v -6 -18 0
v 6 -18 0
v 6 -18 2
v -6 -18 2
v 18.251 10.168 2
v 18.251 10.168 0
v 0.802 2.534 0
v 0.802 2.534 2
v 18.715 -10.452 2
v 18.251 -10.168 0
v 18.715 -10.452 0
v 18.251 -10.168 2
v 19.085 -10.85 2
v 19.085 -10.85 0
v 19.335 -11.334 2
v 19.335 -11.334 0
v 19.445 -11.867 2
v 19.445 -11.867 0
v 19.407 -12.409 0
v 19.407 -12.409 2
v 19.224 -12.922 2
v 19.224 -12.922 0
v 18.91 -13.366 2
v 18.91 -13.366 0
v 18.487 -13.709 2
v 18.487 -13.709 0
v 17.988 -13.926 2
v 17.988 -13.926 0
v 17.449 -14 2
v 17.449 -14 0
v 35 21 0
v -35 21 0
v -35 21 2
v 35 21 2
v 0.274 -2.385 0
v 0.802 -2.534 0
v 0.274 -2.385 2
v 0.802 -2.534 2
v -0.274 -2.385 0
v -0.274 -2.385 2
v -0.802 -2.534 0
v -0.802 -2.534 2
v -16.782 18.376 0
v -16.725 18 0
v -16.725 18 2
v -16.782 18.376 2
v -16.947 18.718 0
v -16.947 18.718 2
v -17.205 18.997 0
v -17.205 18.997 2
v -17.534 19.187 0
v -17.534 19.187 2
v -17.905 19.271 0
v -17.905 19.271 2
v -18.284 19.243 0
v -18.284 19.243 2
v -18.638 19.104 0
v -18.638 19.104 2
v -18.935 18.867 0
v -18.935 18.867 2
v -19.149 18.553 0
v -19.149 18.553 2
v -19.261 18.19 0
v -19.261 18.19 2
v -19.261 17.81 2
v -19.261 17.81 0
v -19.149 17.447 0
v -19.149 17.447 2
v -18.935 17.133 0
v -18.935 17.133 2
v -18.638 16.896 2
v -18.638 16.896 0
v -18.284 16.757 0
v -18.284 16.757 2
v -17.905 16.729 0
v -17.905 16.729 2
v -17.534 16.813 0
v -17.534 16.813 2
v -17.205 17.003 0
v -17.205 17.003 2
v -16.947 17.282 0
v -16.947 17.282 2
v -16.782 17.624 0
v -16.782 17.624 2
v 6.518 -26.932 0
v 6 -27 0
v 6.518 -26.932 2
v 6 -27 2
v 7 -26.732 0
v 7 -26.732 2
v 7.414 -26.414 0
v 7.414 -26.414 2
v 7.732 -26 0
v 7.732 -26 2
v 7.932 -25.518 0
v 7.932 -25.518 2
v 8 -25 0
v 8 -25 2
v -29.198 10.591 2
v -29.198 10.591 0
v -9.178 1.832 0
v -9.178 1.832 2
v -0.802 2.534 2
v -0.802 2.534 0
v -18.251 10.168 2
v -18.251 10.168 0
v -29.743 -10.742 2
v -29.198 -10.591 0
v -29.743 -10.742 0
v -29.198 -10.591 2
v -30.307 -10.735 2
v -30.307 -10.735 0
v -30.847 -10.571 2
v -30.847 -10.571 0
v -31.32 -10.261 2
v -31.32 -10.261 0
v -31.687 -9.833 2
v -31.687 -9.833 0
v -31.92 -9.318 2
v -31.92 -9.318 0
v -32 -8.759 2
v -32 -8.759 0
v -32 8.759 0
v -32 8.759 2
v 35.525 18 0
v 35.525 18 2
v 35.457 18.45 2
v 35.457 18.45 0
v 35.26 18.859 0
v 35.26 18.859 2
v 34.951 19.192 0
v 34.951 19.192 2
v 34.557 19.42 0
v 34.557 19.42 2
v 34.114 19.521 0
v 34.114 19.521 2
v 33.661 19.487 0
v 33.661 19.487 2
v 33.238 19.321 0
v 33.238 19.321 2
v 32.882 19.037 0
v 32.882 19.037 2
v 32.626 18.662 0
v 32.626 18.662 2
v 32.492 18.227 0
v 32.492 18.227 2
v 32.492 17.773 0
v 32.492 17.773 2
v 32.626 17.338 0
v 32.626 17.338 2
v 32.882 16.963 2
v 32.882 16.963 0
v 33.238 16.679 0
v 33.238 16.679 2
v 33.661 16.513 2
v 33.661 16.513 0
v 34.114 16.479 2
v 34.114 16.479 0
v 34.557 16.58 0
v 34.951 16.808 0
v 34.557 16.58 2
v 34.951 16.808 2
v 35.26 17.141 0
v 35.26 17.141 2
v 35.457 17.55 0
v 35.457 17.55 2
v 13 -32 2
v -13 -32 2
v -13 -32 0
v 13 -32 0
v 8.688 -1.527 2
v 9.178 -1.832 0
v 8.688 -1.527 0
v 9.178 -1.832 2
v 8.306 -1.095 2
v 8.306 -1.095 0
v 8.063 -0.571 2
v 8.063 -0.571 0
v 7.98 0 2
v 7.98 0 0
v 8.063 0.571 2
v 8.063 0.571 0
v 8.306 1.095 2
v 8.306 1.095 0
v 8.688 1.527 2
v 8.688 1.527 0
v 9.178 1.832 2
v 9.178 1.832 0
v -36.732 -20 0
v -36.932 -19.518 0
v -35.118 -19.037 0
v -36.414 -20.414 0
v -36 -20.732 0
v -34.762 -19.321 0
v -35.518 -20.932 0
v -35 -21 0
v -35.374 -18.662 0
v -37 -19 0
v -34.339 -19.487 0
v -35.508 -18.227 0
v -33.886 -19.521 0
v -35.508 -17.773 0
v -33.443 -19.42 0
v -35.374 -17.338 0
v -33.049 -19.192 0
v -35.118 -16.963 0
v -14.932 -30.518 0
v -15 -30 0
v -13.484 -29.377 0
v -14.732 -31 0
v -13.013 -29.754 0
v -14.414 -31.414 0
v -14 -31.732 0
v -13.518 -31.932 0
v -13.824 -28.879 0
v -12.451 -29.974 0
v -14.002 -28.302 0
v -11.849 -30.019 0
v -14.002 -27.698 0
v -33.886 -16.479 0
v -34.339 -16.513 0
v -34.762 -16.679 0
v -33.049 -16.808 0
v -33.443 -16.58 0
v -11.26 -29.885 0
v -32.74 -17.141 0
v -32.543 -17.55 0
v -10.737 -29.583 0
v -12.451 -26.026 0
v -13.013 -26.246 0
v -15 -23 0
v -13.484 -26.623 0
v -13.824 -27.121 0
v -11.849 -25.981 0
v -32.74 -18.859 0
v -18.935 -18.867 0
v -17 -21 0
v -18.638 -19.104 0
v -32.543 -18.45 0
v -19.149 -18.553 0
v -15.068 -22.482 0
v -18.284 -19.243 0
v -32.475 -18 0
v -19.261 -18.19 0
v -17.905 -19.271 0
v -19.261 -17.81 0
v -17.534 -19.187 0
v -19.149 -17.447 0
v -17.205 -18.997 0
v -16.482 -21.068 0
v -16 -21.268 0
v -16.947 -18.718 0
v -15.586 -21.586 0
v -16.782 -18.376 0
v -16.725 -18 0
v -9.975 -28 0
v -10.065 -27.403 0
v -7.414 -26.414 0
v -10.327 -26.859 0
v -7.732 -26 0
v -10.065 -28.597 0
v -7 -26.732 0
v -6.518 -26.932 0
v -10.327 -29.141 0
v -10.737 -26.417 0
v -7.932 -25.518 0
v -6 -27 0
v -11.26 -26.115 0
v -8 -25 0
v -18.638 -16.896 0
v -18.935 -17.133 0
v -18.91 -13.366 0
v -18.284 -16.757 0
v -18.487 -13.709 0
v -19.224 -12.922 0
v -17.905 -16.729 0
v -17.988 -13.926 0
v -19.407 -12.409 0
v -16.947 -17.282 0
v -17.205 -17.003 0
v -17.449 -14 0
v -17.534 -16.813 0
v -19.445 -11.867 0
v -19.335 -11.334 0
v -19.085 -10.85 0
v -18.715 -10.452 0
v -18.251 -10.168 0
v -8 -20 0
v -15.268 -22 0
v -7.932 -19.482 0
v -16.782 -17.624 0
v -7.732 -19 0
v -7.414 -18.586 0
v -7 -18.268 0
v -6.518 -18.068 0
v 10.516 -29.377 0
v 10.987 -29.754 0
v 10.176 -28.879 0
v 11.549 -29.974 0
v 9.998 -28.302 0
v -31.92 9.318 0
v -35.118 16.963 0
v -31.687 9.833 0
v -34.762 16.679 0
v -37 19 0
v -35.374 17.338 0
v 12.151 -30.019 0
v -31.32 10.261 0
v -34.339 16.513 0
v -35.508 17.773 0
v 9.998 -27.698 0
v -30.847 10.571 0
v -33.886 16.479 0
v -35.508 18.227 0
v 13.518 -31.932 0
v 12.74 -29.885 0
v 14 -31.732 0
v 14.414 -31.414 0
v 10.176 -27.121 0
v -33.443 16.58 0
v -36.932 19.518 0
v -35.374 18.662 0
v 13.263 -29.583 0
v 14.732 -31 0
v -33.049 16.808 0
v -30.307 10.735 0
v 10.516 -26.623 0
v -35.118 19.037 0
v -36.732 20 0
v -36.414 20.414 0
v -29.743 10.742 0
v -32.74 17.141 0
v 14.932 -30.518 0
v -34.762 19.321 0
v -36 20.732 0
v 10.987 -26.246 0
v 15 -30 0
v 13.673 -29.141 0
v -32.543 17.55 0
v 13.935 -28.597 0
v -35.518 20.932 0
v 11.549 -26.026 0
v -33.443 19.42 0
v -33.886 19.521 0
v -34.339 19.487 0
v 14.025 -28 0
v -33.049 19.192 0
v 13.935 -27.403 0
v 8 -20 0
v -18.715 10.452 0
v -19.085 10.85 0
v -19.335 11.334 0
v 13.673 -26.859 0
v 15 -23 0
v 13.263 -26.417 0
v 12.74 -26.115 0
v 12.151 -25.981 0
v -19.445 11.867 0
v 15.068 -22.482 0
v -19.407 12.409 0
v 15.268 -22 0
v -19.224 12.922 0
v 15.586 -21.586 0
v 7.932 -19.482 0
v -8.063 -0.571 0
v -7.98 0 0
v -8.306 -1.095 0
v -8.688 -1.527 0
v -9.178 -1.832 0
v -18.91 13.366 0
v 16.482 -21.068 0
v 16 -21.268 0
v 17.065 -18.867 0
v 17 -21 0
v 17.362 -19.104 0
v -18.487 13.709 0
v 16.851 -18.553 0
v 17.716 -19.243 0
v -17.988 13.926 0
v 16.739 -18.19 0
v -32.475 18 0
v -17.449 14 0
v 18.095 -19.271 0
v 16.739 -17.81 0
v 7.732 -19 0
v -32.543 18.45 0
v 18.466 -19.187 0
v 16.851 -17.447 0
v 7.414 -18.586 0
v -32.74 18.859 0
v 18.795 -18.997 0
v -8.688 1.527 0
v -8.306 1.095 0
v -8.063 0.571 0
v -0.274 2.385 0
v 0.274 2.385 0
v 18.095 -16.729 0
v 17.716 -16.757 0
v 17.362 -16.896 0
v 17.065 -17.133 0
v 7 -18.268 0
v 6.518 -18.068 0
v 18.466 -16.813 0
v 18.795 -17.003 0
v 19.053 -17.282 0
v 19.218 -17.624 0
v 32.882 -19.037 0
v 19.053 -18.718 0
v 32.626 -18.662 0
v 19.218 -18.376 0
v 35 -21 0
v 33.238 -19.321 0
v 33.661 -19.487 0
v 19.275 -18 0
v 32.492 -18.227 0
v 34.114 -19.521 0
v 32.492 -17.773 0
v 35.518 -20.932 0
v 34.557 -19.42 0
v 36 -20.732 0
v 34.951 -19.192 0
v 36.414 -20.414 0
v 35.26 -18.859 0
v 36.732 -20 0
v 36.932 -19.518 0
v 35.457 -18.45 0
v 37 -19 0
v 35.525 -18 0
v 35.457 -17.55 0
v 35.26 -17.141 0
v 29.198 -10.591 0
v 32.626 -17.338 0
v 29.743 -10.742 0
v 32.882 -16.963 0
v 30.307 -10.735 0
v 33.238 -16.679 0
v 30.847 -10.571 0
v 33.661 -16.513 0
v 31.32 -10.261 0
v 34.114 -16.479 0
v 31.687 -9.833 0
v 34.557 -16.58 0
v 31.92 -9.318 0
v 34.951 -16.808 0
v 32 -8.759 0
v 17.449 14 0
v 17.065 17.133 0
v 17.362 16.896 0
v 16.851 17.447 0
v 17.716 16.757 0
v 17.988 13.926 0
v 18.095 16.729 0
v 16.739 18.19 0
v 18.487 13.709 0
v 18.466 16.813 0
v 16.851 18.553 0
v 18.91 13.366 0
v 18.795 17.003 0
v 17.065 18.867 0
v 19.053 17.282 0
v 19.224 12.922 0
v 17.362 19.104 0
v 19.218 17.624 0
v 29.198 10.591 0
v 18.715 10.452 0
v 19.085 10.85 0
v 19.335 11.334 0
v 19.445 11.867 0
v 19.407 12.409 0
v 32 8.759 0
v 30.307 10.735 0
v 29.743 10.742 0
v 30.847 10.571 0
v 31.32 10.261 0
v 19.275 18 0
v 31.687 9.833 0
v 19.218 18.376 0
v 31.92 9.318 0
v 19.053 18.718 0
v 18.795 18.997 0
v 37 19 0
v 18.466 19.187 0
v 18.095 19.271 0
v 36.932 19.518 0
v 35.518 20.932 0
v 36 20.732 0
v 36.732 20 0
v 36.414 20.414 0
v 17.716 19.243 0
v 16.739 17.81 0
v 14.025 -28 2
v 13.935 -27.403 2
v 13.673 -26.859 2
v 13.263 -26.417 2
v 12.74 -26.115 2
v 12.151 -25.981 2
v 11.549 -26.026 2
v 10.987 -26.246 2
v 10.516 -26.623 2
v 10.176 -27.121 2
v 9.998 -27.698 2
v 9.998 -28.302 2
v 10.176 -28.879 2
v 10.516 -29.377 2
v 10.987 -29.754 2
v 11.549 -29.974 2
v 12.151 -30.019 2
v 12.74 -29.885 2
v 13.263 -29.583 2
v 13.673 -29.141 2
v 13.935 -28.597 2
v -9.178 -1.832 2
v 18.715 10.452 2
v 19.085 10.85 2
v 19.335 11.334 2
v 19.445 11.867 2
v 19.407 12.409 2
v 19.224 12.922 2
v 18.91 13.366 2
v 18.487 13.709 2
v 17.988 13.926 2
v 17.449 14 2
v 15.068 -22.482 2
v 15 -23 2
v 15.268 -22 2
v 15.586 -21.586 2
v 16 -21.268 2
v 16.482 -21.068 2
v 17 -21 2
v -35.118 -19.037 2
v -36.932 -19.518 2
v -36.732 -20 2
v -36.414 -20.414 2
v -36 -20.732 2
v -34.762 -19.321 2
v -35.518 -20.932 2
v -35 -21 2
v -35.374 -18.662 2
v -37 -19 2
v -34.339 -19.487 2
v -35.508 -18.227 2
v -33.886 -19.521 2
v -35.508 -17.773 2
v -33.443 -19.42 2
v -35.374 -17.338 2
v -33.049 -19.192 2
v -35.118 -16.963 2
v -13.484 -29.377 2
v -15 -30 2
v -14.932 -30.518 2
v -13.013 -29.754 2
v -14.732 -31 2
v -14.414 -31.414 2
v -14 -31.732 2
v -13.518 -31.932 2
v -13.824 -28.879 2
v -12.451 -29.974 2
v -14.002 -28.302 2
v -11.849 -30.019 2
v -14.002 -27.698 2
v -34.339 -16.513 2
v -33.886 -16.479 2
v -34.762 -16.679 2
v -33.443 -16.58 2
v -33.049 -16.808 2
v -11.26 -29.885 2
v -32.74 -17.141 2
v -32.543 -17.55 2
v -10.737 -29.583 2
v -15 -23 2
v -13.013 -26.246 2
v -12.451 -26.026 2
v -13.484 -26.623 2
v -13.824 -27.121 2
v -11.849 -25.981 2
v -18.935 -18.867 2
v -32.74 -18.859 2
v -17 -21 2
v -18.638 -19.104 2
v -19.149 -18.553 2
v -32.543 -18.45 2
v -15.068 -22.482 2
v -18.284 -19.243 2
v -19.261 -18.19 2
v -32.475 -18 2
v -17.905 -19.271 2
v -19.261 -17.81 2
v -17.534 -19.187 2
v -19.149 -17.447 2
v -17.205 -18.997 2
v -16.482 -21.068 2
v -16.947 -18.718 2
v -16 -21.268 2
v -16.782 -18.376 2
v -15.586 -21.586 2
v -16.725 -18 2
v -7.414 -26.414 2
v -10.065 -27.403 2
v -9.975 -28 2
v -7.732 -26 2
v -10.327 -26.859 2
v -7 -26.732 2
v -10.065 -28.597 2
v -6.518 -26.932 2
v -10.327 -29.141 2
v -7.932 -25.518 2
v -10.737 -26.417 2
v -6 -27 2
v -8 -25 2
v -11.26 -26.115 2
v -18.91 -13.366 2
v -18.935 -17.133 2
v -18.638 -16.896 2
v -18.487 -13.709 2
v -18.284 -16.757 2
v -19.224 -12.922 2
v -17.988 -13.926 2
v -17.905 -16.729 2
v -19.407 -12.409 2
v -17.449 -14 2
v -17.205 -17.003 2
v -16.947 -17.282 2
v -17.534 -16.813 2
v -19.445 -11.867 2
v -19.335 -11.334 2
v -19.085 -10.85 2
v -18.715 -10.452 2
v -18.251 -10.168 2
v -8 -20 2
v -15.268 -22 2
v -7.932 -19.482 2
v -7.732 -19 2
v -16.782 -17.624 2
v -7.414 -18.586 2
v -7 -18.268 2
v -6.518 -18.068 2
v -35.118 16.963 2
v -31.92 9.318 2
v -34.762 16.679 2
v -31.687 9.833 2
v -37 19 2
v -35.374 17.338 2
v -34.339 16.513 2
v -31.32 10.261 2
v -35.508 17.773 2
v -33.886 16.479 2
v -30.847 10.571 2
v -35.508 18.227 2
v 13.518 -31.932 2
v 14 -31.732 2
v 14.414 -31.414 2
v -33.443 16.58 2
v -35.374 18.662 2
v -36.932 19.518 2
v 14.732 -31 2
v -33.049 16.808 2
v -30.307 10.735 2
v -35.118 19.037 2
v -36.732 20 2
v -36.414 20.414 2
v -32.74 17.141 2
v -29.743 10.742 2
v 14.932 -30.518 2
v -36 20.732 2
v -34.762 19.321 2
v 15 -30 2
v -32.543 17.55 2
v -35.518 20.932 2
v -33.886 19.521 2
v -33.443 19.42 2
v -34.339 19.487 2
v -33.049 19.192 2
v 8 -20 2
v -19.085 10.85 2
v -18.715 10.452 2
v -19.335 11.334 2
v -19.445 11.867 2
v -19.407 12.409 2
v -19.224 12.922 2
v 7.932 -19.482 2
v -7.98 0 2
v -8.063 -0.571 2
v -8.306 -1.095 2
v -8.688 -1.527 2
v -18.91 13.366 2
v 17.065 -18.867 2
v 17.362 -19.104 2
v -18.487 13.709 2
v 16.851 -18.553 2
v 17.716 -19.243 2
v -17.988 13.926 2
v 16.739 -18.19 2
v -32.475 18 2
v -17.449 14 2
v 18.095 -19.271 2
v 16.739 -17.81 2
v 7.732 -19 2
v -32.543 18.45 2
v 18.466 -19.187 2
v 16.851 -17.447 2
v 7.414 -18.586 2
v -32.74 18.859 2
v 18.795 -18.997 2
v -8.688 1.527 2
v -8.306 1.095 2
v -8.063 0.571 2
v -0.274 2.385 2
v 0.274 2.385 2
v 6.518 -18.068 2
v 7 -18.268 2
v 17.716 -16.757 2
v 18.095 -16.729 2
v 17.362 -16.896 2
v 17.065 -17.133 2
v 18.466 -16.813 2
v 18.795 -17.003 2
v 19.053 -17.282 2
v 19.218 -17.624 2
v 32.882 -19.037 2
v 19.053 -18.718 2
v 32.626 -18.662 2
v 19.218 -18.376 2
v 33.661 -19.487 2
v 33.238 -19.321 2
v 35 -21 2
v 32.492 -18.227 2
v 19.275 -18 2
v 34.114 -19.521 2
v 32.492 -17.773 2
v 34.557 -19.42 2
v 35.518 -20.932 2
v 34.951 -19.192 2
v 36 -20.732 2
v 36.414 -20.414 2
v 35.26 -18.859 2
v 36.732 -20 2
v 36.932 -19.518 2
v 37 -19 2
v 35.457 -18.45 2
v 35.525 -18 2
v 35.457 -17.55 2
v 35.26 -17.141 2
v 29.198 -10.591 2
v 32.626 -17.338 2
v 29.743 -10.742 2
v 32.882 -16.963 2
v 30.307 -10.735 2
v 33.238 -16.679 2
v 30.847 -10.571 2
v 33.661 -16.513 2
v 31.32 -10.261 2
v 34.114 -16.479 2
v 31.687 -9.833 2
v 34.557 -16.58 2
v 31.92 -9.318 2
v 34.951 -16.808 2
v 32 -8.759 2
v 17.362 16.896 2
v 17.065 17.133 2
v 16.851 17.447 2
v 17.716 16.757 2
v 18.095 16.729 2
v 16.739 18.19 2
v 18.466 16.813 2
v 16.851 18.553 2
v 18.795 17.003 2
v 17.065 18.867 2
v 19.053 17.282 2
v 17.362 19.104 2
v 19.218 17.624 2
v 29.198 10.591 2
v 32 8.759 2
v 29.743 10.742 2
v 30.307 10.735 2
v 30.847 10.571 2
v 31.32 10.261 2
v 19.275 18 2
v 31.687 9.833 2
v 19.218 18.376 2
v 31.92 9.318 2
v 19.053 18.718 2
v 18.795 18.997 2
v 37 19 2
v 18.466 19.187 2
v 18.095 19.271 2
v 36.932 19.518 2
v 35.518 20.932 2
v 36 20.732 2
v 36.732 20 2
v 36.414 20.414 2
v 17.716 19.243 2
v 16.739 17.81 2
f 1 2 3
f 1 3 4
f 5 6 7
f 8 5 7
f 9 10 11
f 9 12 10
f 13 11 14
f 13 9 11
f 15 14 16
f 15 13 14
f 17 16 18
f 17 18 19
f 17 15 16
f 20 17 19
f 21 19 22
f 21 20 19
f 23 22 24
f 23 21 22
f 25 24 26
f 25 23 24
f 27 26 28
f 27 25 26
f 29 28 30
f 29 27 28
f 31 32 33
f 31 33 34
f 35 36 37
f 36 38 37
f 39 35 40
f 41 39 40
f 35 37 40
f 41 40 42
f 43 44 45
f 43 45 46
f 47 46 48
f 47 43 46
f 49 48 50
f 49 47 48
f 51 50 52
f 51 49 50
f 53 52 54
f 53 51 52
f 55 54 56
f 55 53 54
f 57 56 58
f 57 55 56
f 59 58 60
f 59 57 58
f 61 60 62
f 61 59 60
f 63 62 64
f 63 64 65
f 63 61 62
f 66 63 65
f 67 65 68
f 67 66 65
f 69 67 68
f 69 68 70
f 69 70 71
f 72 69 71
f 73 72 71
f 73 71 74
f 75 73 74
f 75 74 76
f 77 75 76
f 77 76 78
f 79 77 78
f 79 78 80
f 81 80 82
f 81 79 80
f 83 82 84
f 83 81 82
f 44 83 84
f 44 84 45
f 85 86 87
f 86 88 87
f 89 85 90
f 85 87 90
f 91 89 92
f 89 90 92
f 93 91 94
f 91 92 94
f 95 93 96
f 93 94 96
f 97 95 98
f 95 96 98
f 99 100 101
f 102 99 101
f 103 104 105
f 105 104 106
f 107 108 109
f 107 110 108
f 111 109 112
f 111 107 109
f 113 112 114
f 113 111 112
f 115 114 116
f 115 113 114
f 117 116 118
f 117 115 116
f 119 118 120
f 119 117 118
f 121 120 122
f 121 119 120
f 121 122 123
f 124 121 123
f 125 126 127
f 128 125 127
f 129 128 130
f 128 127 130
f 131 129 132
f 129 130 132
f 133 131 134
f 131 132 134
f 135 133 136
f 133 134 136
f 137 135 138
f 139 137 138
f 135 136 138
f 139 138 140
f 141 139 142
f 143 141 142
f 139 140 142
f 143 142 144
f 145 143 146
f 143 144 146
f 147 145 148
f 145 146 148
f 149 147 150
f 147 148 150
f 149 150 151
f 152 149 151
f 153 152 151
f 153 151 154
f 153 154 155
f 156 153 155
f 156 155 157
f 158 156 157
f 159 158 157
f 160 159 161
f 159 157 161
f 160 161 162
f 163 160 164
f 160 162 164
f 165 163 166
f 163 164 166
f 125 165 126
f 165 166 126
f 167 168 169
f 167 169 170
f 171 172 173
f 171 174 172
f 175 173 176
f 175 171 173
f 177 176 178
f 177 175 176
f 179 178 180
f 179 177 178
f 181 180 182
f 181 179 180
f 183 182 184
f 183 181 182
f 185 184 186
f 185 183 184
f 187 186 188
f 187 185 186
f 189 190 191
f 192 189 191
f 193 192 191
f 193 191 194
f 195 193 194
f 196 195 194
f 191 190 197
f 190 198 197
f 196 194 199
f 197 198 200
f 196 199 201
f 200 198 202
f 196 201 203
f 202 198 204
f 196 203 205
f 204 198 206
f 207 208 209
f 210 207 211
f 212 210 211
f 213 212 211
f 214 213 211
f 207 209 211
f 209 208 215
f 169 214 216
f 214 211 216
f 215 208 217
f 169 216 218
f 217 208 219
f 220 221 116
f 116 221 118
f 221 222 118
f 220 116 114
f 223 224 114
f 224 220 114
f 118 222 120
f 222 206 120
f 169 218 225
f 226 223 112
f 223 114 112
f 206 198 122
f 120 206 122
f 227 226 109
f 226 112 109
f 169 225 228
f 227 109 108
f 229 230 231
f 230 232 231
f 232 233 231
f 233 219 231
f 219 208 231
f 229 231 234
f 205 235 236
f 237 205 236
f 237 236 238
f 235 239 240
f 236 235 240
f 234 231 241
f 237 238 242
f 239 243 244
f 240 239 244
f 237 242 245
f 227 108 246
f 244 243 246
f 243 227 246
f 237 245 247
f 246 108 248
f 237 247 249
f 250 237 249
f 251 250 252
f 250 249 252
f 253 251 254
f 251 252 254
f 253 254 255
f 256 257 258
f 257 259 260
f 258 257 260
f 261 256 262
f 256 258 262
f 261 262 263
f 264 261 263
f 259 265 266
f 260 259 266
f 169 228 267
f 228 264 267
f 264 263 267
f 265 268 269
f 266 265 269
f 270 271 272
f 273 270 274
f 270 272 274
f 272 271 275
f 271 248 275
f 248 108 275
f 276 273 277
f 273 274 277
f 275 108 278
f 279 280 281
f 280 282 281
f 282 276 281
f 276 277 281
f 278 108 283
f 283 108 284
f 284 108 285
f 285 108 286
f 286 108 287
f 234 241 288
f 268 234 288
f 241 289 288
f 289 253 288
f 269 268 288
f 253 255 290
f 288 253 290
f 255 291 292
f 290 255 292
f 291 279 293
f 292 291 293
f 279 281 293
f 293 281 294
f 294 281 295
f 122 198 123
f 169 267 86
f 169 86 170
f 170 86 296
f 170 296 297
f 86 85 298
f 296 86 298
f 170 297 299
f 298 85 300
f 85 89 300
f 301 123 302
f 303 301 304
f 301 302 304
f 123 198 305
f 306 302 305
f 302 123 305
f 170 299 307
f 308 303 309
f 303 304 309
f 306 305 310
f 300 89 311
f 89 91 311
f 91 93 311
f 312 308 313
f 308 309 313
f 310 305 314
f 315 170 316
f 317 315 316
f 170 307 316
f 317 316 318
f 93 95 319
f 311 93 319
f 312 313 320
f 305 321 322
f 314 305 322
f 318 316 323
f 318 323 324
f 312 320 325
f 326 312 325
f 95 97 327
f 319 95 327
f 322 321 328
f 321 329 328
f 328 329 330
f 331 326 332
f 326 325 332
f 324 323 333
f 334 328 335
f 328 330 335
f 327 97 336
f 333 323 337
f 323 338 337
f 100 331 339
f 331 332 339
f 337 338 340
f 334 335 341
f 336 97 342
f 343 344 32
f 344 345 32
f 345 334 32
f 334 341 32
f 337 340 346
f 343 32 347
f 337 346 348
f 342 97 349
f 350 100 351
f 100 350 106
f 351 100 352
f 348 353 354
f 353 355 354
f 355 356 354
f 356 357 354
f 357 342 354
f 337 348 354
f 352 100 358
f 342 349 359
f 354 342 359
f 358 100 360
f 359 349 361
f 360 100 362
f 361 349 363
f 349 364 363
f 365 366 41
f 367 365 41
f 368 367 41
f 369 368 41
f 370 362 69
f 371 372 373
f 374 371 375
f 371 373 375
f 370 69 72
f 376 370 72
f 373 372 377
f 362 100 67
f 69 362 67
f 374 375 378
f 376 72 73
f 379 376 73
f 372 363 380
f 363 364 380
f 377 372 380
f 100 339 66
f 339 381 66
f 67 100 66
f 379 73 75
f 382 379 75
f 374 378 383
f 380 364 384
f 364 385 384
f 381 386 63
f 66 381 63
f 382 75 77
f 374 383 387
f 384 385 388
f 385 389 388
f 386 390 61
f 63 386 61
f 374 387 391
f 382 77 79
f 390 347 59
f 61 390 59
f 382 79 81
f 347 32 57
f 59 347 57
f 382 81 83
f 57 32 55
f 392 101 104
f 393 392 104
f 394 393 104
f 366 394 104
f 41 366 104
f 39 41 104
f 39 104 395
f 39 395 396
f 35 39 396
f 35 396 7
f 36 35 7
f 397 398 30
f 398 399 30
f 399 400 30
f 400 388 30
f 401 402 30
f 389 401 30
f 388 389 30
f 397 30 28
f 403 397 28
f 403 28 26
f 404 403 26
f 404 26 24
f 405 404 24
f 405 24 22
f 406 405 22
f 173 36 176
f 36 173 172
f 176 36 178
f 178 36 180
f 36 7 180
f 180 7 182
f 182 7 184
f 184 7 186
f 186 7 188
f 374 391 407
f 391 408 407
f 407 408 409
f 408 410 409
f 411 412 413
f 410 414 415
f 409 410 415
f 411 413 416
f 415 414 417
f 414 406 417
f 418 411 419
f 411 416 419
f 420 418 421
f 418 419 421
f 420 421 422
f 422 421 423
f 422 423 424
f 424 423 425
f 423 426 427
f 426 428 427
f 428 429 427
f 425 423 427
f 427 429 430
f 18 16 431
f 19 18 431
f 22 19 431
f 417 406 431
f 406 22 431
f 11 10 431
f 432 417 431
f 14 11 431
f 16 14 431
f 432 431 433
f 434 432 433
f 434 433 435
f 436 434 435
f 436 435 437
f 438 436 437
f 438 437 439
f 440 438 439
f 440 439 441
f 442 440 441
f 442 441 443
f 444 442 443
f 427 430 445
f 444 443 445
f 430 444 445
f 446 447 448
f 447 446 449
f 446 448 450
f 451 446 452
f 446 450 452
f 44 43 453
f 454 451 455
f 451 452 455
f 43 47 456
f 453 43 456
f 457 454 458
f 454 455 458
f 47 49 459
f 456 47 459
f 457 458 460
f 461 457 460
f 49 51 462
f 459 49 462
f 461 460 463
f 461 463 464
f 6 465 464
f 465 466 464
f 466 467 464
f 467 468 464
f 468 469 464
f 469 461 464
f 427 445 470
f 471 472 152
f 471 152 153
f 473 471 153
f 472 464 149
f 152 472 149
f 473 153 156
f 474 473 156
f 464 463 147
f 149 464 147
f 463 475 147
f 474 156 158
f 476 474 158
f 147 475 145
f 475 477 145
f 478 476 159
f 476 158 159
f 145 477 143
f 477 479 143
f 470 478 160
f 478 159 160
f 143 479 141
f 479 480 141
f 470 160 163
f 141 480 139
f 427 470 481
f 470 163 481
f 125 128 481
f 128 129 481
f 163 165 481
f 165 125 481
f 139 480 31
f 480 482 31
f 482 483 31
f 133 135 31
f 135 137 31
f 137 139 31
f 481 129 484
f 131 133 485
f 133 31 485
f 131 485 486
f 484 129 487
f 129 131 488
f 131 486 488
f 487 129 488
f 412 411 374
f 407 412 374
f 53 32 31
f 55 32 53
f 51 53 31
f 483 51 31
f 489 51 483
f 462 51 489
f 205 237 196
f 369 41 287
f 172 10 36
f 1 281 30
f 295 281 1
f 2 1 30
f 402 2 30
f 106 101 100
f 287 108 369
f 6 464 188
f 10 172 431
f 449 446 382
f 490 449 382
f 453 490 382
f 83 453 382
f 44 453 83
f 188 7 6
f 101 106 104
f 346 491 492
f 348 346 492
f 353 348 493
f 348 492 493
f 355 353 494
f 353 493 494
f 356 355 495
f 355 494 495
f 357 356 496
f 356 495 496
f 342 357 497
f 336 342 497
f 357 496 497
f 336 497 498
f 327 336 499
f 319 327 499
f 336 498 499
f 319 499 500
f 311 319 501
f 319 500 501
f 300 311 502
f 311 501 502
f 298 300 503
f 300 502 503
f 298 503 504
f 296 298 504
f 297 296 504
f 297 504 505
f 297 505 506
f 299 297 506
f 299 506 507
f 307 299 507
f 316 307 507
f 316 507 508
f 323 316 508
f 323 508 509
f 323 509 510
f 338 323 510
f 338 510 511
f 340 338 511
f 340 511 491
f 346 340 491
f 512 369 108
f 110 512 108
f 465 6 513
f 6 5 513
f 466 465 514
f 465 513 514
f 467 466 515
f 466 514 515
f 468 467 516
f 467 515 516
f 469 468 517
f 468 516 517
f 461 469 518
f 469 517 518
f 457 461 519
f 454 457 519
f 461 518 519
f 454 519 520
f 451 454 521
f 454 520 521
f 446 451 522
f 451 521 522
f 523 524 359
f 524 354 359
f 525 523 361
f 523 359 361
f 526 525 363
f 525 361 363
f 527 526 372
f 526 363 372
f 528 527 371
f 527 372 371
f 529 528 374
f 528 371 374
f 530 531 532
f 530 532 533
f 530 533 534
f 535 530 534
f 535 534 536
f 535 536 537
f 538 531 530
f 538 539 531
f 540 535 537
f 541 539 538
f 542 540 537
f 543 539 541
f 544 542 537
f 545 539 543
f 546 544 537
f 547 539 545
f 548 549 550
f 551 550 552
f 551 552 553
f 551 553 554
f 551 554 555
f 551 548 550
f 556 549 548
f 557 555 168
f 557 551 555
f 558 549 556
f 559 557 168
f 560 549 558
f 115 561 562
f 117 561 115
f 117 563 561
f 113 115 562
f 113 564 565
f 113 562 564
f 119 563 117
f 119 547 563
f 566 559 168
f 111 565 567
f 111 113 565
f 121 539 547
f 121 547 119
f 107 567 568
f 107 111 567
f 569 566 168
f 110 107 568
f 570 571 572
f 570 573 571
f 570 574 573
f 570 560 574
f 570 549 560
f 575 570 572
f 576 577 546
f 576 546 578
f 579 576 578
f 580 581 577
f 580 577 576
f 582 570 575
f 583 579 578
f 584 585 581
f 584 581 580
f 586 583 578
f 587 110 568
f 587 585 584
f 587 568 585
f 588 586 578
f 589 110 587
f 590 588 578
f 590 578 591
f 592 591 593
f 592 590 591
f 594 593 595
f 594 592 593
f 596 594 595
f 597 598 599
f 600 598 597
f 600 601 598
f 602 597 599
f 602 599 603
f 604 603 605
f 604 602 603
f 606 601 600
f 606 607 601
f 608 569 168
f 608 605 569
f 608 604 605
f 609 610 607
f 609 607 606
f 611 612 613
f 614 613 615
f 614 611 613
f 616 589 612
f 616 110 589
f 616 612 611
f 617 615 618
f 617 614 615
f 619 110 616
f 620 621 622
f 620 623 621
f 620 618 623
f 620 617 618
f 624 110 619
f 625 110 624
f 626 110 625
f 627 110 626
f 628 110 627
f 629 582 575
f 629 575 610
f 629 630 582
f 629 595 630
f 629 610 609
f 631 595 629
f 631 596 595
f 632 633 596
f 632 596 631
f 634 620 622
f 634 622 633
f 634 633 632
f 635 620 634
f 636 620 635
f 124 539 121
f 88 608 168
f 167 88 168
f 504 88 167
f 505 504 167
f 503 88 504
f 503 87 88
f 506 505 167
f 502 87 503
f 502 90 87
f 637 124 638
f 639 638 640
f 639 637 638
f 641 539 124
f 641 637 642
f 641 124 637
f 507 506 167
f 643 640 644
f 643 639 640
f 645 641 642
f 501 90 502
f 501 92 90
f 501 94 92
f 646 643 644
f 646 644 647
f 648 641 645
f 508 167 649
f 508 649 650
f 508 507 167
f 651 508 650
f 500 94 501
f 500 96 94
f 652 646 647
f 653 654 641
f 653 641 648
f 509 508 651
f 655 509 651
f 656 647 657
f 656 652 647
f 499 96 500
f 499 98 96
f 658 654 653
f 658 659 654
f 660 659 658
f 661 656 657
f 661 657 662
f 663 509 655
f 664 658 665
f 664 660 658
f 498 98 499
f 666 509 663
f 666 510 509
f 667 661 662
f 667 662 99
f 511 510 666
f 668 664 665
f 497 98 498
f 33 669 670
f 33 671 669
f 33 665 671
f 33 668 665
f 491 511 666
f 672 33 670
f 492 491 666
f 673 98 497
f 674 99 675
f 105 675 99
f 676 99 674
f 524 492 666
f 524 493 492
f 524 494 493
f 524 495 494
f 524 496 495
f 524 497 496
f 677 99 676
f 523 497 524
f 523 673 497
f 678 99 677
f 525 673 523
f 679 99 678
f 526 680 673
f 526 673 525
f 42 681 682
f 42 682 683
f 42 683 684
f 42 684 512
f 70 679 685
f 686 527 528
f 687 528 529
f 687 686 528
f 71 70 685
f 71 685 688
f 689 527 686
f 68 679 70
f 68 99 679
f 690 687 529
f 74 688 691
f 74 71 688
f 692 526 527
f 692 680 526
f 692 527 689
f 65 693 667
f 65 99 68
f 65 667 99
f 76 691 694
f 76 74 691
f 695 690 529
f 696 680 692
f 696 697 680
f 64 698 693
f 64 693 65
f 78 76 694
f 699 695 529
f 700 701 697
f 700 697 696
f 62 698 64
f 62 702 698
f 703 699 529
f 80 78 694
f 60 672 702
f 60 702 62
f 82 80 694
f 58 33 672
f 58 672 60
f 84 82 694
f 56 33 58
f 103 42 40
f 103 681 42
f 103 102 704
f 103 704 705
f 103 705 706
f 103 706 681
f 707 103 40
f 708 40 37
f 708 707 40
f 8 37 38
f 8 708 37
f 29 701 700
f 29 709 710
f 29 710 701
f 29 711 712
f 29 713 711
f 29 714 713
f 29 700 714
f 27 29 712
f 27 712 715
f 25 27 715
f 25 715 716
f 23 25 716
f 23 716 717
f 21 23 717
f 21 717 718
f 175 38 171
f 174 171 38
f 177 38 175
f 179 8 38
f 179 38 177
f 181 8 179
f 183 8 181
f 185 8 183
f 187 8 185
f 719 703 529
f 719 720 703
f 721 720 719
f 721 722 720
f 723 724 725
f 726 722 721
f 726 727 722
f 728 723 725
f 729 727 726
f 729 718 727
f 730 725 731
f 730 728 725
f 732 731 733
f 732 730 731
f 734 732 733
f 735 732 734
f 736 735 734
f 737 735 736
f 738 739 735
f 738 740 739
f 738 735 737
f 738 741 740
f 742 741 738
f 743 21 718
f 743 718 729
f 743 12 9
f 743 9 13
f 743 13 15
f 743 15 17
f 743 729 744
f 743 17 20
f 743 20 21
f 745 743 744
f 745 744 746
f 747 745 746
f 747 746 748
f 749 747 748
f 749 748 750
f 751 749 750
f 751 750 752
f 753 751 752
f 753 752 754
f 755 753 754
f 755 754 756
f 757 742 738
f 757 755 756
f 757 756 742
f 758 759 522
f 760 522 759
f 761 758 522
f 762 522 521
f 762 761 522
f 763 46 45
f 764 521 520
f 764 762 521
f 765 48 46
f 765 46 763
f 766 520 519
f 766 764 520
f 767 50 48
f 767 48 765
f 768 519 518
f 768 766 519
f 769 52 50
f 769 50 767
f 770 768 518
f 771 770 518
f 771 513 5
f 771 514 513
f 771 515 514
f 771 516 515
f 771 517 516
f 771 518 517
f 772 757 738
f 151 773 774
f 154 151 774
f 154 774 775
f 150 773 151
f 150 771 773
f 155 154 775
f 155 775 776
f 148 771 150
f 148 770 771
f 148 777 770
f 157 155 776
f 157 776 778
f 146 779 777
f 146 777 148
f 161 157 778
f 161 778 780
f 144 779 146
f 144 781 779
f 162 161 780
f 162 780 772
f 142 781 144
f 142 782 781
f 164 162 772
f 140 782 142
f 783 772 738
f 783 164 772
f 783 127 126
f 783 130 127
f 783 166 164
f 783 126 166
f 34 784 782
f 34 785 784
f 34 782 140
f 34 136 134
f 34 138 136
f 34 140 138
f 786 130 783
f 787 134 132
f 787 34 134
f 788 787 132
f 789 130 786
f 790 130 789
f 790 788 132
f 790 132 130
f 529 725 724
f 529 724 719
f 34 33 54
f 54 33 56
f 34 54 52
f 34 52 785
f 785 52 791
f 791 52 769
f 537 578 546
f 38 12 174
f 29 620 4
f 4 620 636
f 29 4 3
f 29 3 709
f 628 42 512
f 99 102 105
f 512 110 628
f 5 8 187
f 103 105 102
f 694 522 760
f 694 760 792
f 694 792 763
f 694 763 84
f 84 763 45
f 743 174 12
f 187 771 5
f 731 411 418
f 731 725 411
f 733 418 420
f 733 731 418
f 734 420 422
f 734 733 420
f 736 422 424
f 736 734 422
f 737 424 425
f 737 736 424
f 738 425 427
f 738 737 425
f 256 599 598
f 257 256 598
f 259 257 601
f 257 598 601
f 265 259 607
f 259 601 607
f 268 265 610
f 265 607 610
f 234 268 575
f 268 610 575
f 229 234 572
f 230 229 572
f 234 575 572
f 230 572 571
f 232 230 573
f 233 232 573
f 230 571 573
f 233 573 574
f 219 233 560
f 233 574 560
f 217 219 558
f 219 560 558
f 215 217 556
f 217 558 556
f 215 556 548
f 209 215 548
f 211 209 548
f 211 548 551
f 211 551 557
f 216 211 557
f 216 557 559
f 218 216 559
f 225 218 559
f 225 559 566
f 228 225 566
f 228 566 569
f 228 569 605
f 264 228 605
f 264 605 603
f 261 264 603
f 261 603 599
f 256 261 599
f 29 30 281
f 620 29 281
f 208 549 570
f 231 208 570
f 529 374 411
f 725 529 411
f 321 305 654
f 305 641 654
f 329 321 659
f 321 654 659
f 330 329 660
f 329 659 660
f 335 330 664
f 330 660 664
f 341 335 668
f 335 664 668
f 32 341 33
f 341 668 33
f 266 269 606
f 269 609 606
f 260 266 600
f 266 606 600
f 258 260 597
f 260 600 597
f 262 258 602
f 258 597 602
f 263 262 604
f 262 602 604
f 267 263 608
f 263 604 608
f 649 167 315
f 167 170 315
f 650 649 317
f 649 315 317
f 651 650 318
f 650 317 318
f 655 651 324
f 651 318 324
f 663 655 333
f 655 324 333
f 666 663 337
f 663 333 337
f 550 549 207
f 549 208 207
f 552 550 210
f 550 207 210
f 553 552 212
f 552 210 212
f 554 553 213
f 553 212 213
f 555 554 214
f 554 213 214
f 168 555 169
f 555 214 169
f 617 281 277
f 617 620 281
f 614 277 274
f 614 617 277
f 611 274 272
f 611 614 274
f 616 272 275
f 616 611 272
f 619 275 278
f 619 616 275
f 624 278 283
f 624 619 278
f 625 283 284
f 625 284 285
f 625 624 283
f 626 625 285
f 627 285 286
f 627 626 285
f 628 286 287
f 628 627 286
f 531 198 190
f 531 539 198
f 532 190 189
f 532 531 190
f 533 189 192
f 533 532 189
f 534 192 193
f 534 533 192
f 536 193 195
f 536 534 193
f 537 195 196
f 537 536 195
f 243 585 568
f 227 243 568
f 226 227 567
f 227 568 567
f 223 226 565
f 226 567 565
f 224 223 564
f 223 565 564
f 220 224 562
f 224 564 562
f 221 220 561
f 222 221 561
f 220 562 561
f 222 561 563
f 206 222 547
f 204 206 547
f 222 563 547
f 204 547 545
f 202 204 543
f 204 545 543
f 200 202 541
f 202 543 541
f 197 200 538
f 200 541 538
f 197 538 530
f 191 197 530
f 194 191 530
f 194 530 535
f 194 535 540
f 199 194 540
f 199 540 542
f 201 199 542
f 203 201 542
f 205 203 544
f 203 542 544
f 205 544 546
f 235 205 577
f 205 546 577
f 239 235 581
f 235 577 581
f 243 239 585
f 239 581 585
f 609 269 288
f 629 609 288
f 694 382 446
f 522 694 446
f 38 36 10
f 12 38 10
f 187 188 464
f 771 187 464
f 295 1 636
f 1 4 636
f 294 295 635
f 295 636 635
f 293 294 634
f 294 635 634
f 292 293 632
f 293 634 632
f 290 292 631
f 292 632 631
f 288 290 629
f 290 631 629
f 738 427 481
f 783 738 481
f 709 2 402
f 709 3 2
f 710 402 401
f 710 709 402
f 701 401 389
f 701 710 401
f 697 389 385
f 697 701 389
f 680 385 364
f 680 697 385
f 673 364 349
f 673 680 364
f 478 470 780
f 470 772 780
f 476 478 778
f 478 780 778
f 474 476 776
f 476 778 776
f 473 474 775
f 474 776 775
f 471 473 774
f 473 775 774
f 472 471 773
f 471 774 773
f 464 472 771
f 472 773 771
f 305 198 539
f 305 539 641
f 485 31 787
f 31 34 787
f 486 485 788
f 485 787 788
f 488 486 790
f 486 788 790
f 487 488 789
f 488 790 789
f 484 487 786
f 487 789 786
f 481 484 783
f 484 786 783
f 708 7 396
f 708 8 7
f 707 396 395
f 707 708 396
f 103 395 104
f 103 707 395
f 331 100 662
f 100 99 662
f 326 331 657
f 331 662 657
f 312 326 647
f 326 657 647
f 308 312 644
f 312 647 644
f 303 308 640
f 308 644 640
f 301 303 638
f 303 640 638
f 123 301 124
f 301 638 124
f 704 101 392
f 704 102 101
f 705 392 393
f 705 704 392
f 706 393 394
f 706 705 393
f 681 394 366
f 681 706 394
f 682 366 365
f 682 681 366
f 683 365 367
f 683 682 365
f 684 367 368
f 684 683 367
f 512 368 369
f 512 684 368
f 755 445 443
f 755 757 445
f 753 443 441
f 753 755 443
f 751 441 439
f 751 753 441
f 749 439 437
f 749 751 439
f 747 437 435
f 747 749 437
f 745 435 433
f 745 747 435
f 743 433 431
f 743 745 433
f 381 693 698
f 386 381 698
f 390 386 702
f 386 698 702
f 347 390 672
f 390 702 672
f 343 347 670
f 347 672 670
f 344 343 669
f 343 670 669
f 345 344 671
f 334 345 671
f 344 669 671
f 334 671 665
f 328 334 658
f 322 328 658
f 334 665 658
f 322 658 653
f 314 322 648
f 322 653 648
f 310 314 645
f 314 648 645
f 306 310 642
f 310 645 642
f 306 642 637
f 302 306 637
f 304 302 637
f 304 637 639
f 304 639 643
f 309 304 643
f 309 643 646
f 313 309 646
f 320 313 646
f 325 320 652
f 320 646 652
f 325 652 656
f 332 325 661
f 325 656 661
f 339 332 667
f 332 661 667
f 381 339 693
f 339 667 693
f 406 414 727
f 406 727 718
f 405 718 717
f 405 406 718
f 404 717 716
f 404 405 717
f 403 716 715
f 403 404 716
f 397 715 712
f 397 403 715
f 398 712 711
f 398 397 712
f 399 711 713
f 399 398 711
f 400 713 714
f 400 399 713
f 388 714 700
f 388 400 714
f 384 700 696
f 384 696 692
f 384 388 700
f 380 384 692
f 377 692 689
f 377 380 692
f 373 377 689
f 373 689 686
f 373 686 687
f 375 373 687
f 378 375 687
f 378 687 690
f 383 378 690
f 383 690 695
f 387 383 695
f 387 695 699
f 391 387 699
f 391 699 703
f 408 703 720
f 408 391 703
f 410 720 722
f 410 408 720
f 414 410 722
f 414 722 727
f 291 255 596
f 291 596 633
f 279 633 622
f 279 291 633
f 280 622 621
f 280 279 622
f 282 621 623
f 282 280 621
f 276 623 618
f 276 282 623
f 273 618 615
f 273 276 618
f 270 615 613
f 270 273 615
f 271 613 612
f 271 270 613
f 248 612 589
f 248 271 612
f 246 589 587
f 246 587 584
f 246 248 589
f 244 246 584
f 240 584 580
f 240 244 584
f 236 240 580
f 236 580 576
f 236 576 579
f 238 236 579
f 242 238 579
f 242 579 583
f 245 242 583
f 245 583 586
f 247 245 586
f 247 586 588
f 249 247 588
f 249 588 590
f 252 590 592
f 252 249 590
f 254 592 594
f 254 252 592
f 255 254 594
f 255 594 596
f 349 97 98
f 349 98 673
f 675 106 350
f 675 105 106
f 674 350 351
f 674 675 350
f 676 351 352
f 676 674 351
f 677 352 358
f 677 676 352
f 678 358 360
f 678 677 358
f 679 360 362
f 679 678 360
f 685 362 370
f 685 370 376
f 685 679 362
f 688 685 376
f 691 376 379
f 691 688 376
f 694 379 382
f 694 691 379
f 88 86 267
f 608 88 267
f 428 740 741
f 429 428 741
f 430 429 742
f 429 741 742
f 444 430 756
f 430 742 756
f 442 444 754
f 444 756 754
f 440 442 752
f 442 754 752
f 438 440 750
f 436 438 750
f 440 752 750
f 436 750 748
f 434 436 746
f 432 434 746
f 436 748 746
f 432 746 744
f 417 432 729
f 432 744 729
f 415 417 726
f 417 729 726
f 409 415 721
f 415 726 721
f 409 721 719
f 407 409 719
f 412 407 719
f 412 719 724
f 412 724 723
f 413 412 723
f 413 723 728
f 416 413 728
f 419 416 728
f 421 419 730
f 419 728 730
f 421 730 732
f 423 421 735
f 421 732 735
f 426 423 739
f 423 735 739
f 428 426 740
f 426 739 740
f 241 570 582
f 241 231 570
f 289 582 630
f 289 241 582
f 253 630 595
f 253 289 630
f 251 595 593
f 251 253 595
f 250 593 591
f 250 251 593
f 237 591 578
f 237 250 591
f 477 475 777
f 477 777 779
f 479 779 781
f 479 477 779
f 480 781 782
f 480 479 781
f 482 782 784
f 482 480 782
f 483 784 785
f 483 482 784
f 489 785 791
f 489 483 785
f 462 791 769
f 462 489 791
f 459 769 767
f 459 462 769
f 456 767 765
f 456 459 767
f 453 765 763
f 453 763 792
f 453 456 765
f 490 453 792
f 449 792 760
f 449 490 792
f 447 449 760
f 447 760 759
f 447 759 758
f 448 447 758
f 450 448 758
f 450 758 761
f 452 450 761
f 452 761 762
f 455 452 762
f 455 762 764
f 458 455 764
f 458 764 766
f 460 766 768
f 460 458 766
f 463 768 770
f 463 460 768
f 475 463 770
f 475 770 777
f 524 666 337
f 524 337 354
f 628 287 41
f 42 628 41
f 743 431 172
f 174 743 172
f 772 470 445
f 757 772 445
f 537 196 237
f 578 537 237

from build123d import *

# Parameters (mm, degrees)
SKETCH_1_W          = 74
SKETCH_1_H          = 42
SKETCH_1_R          = 1.275
EXTRUDE_1_DEPTH     = 2
SKETCH_2_R          = 1.525
CUT_EXTRUDE_1_DEPTH = 2
FILLET_1_R          = 2
SKETCH_3_W          = 30
SKETCH_3_H          = 22
EXTRUDE_2_DEPTH     = 2
SKETCH_4_R          = 2.025
CUT_EXTRUDE_2_DEPTH = 10
FILLET_2_R          = 2
CUT_EXTRUDE_3_DEPTH = 10
SKETCH_6_W          = 16
SKETCH_6_H          = 9
CUT_EXTRUDE_4_DEPTH = 10
FILLET_3_R          = 2


with BuildPart() as part:
    # 草图1 → 凸台-拉伸1 (new body)
    with BuildSketch(Plane.XY):
        Rectangle(SKETCH_1_W, SKETCH_1_H)
        with Locations((18, 18)):
            Circle(SKETCH_1_R, mode=Mode.SUBTRACT)
        with Locations((-18, 18)):
            Circle(SKETCH_1_R, mode=Mode.SUBTRACT)
        with Locations((-18, -18)):
            Circle(SKETCH_1_R, mode=Mode.SUBTRACT)
        with Locations((18, -18)):
            Circle(SKETCH_1_R, mode=Mode.SUBTRACT)
    extrude(amount=EXTRUDE_1_DEPTH)

    # 草图2 → 切除-拉伸1 (cut)
    with BuildSketch(Plane.XY.offset(2)):
        with Locations((34, 18)):
            Circle(SKETCH_2_R)
        with Locations((-34, 18)):
            Circle(SKETCH_2_R)
        with Locations((-34, -18)):
            Circle(SKETCH_2_R)
        with Locations((34, -18)):
            Circle(SKETCH_2_R)
    extrude(amount=-CUT_EXTRUDE_1_DEPTH, mode=Mode.SUBTRACT)

    # 圆角1
    fillet_1_edges = [part.edges().sort_by_distance(p)[0] for p in [
        (37, -21, 1),
        (-37, -21, 1),
        (-37, 21, 1),
        (37, 21, 1),
    ]]
    fillet(fillet_1_edges, radius=FILLET_1_R)

    # 草图3 → 凸台-拉伸2 (add)
    with BuildSketch(Plane.XY.offset(2)):
        with Locations((0, -21)):
            Rectangle(SKETCH_3_W, SKETCH_3_H)
    extrude(amount=-EXTRUDE_2_DEPTH)

    # 草图4 → 切除-拉伸2 (cut)
    with BuildSketch(Plane.XY.offset(2)):
        with Locations((12, -28)):
            Circle(SKETCH_4_R)
        with Locations((-12, -28)):
            Circle(SKETCH_4_R)
    extrude(amount=-CUT_EXTRUDE_2_DEPTH, mode=Mode.SUBTRACT)

    # 圆角2
    fillet_2_edges = [part.edges().sort_by_distance(p)[0] for p in [
        (15, -21, 1),
        (-15, -21, 1),
        (-15, -32, 1),
        (15, -32, 1),
    ]]
    fillet(fillet_2_edges, radius=FILLET_2_R)

    # 草图5 → 切除-拉伸3 (cut)
    with BuildSketch(Plane(origin=(0, 0, 0), x_dir=(-1, 0, 0), z_dir=(0, 0, -1))):
        Polygon((0, -2.18303115), (-27.010214515, -14), (27.010214515, -14), align=None)
        Polygon((-32, 11.81696885), (-32, -11.81696885), (-4.989785485, 0), align=None)
        Polygon((-27.010214515, 14), (0, 2.18303115), (27.010214515, 14), align=None)
        Polygon((32, 11.81696885), (4.989785485, 0), (32, -11.81696885), align=None)
    extrude(amount=-CUT_EXTRUDE_3_DEPTH, mode=Mode.SUBTRACT)

    # 草图6 → 切除-拉伸4 (cut)
    with BuildSketch(Plane(origin=(0, 0, 0), x_dir=(-1, 0, 0), z_dir=(0, 0, -1))):
        with Locations((0, -22.5)):
            Rectangle(SKETCH_6_W, SKETCH_6_H)
    extrude(amount=-CUT_EXTRUDE_4_DEPTH, mode=Mode.SUBTRACT)

    # 圆角3
    fillet_3_edges = [part.edges().sort_by_distance(p)[0] for p in [
        (0, 2.18303115, 1),
        (27.010214515, 14, 1),
        (-27.010214515, 14, 1),
        (32, -11.81696885, 1),
        (32, 11.81696885, 1),
        (4.989785485, 0, 1),
        (-4.989785485, 0, 1),
        (-32, 11.81696885, 1),
        (-32, -11.81696885, 1),
        (27.010214515, -14, 1),
        (0, -2.18303115, 1),
        (-27.010214515, -14, 1),
        (-8, -18, 1),
        (-8, -27, 1),
        (8, -27, 1),
        (8, -18, 1),
    ]]
    fillet(fillet_3_edges, radius=FILLET_3_R)


solid = part.part
